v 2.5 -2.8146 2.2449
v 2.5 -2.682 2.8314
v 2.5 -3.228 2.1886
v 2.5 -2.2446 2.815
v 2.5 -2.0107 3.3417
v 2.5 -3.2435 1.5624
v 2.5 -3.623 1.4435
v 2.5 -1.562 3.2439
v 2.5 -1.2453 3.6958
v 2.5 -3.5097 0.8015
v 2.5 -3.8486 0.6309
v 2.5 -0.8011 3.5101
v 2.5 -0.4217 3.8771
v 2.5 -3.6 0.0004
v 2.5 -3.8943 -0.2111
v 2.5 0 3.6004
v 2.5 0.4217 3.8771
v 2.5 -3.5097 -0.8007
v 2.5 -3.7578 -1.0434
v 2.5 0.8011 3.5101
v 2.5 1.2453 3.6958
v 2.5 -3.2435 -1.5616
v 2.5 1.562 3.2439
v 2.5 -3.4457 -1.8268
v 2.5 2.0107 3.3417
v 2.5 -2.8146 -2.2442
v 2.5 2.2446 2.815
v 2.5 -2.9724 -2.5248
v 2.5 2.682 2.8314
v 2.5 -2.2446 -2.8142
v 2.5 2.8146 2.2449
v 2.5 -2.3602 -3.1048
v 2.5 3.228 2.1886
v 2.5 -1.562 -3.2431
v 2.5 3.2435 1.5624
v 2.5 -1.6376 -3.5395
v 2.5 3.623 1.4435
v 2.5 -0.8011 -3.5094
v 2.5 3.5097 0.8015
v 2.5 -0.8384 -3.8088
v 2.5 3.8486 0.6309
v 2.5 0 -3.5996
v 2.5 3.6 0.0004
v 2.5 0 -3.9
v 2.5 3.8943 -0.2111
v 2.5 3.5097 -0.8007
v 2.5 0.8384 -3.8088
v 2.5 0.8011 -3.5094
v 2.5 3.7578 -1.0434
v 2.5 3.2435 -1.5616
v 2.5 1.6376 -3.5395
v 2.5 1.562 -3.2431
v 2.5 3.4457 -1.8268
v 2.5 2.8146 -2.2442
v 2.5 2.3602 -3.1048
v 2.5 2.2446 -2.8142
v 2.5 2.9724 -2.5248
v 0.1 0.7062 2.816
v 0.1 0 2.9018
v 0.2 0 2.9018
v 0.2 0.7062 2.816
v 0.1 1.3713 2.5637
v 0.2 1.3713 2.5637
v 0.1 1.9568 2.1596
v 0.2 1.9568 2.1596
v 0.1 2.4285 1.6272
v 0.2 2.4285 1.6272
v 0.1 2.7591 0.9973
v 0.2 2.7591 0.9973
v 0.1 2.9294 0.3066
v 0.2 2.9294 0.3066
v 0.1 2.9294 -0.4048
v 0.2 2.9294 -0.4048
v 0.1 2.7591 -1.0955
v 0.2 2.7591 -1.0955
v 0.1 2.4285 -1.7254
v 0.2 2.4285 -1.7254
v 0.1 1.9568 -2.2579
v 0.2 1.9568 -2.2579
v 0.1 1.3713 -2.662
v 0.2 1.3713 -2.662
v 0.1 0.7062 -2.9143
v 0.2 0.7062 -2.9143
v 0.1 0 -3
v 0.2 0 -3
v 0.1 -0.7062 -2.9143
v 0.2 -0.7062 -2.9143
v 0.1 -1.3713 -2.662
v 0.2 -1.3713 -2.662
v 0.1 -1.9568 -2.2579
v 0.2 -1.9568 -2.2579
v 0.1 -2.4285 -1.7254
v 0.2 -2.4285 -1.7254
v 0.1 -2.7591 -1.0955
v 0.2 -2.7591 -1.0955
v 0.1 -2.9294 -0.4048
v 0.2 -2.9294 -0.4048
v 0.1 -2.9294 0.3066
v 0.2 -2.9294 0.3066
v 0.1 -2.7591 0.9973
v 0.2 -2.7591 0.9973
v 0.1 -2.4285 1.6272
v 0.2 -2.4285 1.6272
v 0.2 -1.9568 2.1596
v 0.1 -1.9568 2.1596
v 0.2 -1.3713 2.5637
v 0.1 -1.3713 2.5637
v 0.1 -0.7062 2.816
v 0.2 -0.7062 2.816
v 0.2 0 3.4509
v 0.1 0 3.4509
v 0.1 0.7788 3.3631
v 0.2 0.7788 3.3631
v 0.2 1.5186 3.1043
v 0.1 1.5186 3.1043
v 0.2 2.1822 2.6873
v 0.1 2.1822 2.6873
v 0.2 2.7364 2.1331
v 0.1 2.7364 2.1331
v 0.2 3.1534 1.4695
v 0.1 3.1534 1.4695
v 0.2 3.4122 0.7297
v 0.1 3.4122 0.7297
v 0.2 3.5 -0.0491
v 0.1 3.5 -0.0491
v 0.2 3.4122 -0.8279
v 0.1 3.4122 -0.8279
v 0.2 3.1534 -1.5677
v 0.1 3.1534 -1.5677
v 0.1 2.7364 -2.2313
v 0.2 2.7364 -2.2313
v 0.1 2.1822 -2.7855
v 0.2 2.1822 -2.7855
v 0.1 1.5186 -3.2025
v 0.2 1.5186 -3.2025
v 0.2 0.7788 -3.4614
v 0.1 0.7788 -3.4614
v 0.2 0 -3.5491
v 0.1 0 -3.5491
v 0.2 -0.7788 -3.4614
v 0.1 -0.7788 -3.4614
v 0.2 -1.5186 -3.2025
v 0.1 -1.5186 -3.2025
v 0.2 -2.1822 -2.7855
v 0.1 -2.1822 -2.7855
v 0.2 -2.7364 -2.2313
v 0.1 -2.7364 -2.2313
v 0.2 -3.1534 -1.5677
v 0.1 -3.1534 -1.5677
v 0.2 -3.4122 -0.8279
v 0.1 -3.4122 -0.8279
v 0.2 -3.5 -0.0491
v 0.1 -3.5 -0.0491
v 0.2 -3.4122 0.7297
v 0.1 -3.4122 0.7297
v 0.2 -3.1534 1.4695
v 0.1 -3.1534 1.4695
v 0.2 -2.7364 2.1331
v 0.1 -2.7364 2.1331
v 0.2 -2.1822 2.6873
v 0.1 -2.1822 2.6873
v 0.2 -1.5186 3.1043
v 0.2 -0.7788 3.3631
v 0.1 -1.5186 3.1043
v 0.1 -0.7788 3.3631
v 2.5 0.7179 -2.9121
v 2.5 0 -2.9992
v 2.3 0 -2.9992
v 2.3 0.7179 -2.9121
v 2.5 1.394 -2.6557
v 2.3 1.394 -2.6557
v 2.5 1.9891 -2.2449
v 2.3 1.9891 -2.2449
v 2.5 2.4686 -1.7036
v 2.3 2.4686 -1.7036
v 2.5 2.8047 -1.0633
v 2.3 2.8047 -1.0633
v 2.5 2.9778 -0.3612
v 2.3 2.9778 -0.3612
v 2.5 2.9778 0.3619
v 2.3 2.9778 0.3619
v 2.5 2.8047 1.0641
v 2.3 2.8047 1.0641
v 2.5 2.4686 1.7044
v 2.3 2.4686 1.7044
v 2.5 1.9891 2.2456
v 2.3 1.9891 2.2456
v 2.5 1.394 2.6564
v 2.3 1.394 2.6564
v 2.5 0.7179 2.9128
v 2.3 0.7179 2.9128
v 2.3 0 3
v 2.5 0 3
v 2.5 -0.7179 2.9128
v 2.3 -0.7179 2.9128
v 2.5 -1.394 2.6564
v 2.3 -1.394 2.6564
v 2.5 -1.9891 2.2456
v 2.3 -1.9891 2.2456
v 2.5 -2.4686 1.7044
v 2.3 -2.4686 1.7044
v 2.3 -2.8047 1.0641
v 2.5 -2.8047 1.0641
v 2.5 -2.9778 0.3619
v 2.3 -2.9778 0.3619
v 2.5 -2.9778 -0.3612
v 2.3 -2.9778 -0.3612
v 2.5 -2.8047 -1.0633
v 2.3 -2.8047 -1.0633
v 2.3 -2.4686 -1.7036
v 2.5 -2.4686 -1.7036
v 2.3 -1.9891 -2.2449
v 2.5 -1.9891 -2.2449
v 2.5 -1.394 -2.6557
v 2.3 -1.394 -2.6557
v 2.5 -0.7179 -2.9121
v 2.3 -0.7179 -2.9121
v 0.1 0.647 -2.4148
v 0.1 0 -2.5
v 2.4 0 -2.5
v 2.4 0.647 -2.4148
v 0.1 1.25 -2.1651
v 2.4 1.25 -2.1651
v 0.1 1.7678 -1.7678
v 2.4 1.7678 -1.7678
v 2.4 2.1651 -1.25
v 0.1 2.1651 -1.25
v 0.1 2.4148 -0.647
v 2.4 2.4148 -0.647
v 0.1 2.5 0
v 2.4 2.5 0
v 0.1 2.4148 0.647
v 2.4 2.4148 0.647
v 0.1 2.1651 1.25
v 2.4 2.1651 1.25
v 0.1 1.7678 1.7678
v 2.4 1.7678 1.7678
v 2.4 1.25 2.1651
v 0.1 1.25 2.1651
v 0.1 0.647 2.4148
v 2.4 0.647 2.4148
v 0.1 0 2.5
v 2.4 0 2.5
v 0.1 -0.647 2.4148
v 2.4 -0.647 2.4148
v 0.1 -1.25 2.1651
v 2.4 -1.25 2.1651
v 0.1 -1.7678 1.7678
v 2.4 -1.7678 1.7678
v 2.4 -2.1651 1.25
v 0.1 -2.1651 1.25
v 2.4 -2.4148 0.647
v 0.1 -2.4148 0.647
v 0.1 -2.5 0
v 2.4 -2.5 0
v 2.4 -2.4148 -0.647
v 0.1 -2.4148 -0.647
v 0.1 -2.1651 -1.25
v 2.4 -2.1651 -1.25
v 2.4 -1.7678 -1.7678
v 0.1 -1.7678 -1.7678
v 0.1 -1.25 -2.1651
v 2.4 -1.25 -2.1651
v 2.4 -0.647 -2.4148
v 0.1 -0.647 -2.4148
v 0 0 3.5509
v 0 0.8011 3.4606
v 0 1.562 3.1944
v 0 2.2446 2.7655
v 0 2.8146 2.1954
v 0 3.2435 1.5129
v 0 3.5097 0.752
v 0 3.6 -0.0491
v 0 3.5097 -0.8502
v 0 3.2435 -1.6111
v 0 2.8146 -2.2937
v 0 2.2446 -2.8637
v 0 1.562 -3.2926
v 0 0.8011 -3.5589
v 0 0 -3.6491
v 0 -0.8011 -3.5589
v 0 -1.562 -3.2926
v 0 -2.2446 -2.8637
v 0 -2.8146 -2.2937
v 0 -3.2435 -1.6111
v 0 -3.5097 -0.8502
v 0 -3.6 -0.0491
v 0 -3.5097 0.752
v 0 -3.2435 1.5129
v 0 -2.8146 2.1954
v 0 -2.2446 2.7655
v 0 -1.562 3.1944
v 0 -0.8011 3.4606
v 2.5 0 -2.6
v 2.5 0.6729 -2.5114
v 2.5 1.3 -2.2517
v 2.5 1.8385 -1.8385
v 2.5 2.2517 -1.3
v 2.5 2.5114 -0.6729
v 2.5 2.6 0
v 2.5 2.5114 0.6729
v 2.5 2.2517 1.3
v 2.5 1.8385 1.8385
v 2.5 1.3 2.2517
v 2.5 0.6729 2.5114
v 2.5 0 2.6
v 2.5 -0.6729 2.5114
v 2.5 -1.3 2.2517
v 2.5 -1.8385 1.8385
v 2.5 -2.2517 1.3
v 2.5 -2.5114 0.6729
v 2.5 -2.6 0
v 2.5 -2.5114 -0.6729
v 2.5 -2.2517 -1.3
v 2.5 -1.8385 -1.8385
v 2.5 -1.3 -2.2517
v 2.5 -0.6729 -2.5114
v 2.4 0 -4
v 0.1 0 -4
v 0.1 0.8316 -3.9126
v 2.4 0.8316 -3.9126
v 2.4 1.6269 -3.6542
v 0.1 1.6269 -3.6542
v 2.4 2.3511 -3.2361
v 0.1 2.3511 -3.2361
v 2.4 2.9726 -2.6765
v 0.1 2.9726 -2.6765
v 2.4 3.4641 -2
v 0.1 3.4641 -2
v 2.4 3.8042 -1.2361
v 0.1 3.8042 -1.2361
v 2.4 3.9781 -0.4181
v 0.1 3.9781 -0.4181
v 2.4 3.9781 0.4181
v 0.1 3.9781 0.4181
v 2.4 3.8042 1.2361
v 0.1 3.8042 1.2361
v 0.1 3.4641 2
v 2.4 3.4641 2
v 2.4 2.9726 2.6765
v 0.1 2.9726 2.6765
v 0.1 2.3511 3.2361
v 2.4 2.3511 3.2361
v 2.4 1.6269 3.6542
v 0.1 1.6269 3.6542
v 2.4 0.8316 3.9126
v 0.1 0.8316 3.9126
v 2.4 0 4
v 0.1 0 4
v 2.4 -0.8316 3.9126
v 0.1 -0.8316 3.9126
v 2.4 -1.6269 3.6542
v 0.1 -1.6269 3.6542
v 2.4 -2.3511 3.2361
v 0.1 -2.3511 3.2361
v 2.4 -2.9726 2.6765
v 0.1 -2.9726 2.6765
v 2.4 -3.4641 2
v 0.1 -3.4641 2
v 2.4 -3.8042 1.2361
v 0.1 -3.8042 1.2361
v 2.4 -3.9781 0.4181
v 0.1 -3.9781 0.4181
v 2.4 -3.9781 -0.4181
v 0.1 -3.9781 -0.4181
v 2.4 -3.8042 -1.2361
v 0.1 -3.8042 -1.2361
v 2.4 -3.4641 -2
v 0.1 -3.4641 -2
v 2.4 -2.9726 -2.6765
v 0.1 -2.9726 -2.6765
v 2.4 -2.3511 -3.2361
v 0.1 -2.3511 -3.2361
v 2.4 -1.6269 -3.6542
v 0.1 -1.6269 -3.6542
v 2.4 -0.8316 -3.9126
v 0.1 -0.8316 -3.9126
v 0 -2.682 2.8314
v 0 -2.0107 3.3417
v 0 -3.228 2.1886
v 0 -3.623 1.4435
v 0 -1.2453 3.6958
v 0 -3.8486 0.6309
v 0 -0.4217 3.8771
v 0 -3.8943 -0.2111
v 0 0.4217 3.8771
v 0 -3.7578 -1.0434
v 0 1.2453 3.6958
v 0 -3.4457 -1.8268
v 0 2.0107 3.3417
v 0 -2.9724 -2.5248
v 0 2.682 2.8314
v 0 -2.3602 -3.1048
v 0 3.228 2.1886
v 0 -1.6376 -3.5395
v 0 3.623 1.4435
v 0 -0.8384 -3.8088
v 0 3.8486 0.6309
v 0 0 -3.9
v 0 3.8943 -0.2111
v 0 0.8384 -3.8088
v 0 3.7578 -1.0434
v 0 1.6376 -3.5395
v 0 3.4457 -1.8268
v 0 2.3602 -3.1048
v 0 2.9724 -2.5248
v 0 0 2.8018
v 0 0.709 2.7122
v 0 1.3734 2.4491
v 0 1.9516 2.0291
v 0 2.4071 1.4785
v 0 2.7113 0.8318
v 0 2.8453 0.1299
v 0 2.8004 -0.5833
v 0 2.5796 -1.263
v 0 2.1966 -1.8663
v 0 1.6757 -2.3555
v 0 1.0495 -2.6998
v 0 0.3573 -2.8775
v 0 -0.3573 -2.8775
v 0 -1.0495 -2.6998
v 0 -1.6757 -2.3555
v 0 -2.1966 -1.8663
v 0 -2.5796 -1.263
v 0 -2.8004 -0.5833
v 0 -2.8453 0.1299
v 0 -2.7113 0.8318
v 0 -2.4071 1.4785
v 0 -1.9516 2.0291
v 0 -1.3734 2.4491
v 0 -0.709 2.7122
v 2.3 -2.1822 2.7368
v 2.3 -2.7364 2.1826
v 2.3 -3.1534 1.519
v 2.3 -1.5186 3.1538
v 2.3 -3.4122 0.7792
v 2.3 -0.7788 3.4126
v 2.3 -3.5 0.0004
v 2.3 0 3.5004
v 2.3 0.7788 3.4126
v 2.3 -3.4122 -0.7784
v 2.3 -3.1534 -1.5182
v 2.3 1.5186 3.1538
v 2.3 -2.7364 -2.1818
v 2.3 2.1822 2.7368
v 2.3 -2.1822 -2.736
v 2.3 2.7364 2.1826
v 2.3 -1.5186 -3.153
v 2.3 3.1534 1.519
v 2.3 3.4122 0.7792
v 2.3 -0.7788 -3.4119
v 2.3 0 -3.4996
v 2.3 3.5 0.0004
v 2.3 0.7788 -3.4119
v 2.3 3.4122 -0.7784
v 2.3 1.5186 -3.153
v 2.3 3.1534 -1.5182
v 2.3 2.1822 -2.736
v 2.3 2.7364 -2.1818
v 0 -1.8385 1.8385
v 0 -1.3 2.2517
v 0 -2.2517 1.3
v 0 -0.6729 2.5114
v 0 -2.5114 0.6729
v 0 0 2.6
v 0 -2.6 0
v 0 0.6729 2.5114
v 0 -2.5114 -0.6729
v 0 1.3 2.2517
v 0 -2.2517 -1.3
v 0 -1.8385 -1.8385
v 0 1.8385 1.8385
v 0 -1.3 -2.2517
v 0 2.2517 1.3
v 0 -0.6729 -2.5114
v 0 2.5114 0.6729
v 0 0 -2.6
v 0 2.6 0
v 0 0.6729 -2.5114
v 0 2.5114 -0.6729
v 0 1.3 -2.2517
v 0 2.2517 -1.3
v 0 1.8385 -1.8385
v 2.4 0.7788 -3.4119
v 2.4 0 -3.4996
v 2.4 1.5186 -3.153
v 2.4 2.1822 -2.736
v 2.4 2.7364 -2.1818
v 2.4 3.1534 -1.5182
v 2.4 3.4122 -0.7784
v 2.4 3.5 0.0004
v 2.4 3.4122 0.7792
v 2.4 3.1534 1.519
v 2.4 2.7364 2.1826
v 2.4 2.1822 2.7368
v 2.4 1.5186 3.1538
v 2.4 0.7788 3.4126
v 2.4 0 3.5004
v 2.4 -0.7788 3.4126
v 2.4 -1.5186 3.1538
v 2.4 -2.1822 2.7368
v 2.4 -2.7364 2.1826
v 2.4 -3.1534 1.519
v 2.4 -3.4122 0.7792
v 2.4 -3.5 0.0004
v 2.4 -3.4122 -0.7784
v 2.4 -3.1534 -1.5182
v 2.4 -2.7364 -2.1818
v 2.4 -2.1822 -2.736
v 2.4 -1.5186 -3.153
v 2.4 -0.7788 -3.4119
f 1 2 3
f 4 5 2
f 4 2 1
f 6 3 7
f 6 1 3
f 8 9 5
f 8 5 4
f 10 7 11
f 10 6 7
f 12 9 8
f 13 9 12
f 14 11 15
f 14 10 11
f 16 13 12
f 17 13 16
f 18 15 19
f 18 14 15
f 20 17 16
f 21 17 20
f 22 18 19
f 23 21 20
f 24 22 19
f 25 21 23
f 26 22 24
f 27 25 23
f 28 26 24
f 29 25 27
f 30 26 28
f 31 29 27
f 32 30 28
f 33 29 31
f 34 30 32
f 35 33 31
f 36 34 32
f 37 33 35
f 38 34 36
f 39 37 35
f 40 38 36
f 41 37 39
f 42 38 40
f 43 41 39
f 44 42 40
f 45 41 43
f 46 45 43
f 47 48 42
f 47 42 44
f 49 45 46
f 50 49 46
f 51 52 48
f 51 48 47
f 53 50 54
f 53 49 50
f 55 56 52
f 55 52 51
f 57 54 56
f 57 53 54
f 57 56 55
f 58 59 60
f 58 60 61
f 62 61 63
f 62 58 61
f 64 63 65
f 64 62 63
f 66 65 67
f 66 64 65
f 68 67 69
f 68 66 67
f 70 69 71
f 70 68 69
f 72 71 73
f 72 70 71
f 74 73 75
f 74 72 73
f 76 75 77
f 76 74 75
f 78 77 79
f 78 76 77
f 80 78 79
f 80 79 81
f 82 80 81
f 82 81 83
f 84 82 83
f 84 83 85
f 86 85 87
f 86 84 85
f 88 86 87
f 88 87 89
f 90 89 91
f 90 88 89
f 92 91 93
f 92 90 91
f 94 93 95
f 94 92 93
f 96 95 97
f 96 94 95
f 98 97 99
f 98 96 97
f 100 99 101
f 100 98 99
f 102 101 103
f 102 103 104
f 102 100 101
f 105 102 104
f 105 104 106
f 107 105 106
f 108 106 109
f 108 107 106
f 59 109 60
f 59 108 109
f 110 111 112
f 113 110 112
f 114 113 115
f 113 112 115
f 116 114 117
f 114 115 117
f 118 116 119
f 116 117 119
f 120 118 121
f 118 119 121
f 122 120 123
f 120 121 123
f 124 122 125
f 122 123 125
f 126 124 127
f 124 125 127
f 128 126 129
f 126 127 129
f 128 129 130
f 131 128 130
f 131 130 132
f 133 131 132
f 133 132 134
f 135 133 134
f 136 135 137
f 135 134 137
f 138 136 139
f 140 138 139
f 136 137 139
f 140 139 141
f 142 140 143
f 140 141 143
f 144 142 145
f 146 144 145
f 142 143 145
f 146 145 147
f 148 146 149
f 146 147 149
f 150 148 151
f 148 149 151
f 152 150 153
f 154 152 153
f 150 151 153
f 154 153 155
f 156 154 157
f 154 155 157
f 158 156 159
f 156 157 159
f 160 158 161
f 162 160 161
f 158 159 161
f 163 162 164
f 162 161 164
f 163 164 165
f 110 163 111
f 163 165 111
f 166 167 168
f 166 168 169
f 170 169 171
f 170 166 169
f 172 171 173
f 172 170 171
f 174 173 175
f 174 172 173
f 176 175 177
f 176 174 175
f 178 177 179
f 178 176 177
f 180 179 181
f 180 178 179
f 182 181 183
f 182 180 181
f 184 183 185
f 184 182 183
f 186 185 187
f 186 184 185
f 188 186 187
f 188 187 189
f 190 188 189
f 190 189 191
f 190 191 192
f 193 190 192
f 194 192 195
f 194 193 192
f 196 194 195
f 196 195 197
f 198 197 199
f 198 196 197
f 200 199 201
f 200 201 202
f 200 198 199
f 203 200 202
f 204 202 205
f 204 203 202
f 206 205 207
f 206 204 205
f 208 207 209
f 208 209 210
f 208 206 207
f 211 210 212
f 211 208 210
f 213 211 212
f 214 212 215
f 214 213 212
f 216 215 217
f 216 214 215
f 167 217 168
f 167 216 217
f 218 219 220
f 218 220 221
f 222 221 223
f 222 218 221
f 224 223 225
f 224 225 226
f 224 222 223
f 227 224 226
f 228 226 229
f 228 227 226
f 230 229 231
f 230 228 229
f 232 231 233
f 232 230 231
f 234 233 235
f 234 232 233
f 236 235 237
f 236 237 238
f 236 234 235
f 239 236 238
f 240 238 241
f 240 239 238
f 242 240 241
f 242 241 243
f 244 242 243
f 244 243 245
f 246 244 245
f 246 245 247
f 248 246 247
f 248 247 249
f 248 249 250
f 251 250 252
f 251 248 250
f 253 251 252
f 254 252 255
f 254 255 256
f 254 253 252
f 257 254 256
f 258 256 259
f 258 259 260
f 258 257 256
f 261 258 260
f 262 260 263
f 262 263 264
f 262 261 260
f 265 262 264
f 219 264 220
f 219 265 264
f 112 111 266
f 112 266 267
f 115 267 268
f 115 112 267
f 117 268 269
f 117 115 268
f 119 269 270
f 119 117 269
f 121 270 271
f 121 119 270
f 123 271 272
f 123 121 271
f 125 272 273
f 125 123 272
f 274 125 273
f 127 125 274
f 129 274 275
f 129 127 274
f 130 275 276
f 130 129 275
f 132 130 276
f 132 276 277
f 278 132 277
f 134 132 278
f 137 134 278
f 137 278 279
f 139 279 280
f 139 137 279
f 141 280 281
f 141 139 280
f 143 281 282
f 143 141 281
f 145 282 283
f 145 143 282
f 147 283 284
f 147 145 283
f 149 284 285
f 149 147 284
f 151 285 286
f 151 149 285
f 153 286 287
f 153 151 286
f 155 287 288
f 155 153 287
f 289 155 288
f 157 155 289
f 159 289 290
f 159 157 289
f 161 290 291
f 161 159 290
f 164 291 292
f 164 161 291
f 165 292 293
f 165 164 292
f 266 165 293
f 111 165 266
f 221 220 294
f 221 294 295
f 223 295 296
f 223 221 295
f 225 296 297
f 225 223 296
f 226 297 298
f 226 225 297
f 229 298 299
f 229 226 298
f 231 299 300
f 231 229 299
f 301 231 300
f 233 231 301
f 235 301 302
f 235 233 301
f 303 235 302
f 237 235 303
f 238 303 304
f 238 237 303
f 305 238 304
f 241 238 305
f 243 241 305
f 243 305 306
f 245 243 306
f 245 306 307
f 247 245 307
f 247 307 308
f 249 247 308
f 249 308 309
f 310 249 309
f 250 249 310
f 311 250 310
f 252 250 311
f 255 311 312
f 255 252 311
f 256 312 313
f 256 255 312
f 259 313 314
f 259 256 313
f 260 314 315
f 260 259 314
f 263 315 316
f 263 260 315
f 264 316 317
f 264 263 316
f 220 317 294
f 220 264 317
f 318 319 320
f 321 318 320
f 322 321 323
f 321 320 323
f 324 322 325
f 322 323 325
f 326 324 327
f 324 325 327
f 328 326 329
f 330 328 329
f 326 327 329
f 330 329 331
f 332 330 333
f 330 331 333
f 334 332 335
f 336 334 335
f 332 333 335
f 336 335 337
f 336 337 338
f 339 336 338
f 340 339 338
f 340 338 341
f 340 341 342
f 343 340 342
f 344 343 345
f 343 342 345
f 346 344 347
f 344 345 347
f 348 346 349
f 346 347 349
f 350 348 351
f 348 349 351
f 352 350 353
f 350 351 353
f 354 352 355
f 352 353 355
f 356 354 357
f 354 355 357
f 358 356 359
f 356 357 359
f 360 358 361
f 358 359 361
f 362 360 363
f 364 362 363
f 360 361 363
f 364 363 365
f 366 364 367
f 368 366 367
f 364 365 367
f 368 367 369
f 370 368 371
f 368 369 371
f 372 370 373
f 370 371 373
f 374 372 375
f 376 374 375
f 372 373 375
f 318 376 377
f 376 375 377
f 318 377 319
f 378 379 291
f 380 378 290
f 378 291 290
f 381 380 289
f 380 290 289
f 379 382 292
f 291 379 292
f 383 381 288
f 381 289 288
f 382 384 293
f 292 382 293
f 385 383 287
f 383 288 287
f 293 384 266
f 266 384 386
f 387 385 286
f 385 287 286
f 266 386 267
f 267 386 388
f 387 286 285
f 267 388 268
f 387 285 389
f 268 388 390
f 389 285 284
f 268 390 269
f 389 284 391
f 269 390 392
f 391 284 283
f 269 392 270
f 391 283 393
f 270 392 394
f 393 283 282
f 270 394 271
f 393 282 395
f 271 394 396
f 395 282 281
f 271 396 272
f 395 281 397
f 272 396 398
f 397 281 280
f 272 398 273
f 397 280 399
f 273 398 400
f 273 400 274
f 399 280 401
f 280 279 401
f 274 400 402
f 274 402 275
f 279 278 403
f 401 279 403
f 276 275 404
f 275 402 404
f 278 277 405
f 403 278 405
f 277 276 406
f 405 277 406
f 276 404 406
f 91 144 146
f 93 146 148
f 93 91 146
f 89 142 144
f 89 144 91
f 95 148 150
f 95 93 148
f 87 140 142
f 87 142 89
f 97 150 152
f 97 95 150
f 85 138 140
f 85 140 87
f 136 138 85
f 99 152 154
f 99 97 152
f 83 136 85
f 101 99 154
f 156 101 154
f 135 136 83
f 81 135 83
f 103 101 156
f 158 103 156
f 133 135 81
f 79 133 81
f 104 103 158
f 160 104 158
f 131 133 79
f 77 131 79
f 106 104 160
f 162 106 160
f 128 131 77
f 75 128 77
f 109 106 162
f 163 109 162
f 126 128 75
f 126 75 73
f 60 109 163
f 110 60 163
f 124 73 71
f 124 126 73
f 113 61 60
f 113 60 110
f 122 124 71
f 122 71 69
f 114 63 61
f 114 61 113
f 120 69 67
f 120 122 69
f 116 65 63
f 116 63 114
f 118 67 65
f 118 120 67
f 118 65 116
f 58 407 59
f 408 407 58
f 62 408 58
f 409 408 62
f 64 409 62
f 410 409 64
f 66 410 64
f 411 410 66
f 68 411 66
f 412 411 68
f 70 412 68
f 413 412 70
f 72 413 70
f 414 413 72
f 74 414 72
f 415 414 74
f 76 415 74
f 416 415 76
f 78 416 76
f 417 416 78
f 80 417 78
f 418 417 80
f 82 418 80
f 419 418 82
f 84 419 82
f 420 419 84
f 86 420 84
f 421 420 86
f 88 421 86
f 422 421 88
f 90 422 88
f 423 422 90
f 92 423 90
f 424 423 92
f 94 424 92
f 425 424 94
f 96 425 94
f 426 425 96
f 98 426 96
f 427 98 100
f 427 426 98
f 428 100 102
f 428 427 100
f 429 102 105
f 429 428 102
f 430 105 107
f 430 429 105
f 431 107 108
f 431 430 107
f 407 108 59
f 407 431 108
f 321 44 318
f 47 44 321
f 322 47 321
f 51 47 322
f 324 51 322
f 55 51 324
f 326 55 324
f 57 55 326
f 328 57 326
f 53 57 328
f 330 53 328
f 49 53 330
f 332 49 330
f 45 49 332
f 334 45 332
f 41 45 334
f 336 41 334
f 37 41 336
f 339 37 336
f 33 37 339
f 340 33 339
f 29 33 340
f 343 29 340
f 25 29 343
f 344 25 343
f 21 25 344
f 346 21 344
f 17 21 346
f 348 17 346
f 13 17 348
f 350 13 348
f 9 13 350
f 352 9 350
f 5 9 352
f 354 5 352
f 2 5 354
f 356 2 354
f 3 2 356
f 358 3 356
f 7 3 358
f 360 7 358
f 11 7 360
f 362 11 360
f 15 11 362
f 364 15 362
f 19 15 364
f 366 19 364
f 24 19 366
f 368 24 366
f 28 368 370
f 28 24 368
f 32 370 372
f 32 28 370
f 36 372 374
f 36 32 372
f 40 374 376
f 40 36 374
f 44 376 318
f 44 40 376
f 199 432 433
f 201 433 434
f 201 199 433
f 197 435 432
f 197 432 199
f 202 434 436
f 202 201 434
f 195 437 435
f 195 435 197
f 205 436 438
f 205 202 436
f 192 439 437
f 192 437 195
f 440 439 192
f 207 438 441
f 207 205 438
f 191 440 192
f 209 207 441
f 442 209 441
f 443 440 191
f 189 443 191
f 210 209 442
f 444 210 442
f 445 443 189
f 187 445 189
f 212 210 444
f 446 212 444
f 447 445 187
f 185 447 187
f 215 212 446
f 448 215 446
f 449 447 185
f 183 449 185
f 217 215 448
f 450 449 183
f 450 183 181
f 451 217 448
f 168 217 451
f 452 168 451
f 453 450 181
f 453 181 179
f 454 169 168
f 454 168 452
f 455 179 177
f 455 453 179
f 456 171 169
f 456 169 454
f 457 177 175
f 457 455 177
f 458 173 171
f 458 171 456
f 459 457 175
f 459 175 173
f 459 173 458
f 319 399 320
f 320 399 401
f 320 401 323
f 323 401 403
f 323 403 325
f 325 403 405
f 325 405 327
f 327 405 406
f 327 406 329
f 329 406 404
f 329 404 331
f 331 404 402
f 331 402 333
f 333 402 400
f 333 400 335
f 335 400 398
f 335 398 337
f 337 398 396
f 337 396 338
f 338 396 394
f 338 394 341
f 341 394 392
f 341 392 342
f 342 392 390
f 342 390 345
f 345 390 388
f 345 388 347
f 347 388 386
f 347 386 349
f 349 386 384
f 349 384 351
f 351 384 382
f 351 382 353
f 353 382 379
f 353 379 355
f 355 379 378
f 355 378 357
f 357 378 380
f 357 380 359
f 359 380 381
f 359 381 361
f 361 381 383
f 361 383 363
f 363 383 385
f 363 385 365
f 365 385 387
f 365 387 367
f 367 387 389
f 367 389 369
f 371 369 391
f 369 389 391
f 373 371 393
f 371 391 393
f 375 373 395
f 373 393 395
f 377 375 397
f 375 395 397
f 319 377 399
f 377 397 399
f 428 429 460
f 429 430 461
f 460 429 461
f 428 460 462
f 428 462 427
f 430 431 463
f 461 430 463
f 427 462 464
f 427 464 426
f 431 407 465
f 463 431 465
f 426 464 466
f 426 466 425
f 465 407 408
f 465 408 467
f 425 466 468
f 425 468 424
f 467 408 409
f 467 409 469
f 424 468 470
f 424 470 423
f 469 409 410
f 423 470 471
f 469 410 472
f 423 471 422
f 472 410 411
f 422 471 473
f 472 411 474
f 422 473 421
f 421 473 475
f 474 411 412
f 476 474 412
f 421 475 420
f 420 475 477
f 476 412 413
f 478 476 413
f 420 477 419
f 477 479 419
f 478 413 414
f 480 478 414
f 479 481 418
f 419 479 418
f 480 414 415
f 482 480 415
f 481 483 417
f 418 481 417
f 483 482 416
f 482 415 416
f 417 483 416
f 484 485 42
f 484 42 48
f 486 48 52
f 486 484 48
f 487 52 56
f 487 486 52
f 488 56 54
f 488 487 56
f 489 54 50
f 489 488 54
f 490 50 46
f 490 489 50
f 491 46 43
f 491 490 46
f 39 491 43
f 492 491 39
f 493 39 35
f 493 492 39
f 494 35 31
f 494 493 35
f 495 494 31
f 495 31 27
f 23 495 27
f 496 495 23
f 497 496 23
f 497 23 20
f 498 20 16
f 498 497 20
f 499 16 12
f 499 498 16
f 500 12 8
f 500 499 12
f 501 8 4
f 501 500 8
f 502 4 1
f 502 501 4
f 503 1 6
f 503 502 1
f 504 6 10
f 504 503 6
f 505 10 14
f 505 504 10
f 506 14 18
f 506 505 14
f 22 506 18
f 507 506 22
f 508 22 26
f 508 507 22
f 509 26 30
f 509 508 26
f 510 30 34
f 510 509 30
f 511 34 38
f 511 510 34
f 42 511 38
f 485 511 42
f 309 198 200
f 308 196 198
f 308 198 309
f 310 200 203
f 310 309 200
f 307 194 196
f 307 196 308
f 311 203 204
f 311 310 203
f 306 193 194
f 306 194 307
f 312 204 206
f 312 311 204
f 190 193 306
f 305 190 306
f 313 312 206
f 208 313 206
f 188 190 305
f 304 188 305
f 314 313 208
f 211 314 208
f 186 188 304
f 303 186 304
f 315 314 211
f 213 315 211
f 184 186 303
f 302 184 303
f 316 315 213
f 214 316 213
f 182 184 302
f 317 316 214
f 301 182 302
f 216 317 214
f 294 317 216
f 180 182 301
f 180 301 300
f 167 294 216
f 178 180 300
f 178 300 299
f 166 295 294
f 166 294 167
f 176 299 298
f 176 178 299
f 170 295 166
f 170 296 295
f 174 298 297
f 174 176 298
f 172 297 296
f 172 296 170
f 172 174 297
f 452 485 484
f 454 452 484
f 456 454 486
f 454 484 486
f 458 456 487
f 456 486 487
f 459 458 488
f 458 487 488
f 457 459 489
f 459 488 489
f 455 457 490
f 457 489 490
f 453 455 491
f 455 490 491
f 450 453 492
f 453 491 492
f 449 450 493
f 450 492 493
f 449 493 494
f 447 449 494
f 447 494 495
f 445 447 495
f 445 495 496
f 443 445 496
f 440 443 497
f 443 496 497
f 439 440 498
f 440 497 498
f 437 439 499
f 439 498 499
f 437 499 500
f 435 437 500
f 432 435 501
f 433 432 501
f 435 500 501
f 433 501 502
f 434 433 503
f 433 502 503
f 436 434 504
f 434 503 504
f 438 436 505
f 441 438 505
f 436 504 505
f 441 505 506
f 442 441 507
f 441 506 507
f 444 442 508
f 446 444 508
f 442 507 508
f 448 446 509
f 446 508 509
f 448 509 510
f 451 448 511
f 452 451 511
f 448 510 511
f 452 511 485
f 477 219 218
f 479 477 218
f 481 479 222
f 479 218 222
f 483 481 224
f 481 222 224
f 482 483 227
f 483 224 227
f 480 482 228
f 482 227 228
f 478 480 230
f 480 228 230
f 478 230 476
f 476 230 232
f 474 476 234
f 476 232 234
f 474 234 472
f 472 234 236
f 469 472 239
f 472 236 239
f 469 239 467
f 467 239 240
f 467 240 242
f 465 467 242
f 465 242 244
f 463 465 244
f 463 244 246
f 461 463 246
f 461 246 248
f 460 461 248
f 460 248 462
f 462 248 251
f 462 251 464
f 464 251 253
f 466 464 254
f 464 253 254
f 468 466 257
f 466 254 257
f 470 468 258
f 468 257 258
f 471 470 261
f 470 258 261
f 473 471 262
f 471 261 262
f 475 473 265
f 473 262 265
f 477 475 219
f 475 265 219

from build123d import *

# Parameters (mm, degrees)
SKETCH_1_R          = 4
SKETCH_1_R_2        = 2.5
EXTRUDE_1_DEPTH     = 2.5
SKETCH_2_R          = 3.5
SKETCH_2_R_2        = 2.999624375
CUT_EXTRUDE_1_DEPTH = 0.2
SKETCH_3_R          = 3.5
SKETCH_3_R_2        = 2.950876812
CUT_EXTRUDE_2_DEPTH = 0.2
CHAMFER_1_SIZE      = 0.1


with BuildPart() as part:
    # 草图1 → 凸台-拉伸1 (new body)
    with BuildSketch(Plane(origin=(0, 0, 0), x_dir=(0, 0, -1), z_dir=(1, 0, 0))):
        Circle(SKETCH_1_R)
        Circle(SKETCH_1_R_2, mode=Mode.SUBTRACT)
    extrude(amount=EXTRUDE_1_DEPTH)

    # 草图2 → 切除-拉伸1 (cut)
    with BuildSketch(Plane(origin=(2.5, 0, 0), x_dir=(0, 0, -1), z_dir=(1, 0, 0))):
        with Locations((-0.000375625, 0)):
            Circle(SKETCH_2_R)
        with Locations((-0.000375625, 0)):
            Circle(SKETCH_2_R_2, mode=Mode.SUBTRACT)
    extrude(amount=-CUT_EXTRUDE_1_DEPTH, mode=Mode.SUBTRACT)

    # 草图3 → 切除-拉伸2 (cut)
    with BuildSketch(Plane.ZY):
        with Locations((-0.049123188, 0)):
            Circle(SKETCH_3_R)
        with Locations((-0.049123188, 0)):
            Circle(SKETCH_3_R_2, mode=Mode.SUBTRACT)
    extrude(amount=-CUT_EXTRUDE_2_DEPTH, mode=Mode.SUBTRACT)

    # 倒角1
    chamfer_1_edges = [part.edges().sort_by_distance(p)[0] for p in [
        (2.5, 0, 3.500375625),
        (0, 0, 4),
        (0, 0, -3.549123188),
        (0, 0, -3),
        (2.5, 0, 4),
        (0, 0, 2.5),
        (2.5, 0, 2.5),
    ]]
    chamfer(chamfer_1_edges, length=CHAMFER_1_SIZE)


solid = part.part
